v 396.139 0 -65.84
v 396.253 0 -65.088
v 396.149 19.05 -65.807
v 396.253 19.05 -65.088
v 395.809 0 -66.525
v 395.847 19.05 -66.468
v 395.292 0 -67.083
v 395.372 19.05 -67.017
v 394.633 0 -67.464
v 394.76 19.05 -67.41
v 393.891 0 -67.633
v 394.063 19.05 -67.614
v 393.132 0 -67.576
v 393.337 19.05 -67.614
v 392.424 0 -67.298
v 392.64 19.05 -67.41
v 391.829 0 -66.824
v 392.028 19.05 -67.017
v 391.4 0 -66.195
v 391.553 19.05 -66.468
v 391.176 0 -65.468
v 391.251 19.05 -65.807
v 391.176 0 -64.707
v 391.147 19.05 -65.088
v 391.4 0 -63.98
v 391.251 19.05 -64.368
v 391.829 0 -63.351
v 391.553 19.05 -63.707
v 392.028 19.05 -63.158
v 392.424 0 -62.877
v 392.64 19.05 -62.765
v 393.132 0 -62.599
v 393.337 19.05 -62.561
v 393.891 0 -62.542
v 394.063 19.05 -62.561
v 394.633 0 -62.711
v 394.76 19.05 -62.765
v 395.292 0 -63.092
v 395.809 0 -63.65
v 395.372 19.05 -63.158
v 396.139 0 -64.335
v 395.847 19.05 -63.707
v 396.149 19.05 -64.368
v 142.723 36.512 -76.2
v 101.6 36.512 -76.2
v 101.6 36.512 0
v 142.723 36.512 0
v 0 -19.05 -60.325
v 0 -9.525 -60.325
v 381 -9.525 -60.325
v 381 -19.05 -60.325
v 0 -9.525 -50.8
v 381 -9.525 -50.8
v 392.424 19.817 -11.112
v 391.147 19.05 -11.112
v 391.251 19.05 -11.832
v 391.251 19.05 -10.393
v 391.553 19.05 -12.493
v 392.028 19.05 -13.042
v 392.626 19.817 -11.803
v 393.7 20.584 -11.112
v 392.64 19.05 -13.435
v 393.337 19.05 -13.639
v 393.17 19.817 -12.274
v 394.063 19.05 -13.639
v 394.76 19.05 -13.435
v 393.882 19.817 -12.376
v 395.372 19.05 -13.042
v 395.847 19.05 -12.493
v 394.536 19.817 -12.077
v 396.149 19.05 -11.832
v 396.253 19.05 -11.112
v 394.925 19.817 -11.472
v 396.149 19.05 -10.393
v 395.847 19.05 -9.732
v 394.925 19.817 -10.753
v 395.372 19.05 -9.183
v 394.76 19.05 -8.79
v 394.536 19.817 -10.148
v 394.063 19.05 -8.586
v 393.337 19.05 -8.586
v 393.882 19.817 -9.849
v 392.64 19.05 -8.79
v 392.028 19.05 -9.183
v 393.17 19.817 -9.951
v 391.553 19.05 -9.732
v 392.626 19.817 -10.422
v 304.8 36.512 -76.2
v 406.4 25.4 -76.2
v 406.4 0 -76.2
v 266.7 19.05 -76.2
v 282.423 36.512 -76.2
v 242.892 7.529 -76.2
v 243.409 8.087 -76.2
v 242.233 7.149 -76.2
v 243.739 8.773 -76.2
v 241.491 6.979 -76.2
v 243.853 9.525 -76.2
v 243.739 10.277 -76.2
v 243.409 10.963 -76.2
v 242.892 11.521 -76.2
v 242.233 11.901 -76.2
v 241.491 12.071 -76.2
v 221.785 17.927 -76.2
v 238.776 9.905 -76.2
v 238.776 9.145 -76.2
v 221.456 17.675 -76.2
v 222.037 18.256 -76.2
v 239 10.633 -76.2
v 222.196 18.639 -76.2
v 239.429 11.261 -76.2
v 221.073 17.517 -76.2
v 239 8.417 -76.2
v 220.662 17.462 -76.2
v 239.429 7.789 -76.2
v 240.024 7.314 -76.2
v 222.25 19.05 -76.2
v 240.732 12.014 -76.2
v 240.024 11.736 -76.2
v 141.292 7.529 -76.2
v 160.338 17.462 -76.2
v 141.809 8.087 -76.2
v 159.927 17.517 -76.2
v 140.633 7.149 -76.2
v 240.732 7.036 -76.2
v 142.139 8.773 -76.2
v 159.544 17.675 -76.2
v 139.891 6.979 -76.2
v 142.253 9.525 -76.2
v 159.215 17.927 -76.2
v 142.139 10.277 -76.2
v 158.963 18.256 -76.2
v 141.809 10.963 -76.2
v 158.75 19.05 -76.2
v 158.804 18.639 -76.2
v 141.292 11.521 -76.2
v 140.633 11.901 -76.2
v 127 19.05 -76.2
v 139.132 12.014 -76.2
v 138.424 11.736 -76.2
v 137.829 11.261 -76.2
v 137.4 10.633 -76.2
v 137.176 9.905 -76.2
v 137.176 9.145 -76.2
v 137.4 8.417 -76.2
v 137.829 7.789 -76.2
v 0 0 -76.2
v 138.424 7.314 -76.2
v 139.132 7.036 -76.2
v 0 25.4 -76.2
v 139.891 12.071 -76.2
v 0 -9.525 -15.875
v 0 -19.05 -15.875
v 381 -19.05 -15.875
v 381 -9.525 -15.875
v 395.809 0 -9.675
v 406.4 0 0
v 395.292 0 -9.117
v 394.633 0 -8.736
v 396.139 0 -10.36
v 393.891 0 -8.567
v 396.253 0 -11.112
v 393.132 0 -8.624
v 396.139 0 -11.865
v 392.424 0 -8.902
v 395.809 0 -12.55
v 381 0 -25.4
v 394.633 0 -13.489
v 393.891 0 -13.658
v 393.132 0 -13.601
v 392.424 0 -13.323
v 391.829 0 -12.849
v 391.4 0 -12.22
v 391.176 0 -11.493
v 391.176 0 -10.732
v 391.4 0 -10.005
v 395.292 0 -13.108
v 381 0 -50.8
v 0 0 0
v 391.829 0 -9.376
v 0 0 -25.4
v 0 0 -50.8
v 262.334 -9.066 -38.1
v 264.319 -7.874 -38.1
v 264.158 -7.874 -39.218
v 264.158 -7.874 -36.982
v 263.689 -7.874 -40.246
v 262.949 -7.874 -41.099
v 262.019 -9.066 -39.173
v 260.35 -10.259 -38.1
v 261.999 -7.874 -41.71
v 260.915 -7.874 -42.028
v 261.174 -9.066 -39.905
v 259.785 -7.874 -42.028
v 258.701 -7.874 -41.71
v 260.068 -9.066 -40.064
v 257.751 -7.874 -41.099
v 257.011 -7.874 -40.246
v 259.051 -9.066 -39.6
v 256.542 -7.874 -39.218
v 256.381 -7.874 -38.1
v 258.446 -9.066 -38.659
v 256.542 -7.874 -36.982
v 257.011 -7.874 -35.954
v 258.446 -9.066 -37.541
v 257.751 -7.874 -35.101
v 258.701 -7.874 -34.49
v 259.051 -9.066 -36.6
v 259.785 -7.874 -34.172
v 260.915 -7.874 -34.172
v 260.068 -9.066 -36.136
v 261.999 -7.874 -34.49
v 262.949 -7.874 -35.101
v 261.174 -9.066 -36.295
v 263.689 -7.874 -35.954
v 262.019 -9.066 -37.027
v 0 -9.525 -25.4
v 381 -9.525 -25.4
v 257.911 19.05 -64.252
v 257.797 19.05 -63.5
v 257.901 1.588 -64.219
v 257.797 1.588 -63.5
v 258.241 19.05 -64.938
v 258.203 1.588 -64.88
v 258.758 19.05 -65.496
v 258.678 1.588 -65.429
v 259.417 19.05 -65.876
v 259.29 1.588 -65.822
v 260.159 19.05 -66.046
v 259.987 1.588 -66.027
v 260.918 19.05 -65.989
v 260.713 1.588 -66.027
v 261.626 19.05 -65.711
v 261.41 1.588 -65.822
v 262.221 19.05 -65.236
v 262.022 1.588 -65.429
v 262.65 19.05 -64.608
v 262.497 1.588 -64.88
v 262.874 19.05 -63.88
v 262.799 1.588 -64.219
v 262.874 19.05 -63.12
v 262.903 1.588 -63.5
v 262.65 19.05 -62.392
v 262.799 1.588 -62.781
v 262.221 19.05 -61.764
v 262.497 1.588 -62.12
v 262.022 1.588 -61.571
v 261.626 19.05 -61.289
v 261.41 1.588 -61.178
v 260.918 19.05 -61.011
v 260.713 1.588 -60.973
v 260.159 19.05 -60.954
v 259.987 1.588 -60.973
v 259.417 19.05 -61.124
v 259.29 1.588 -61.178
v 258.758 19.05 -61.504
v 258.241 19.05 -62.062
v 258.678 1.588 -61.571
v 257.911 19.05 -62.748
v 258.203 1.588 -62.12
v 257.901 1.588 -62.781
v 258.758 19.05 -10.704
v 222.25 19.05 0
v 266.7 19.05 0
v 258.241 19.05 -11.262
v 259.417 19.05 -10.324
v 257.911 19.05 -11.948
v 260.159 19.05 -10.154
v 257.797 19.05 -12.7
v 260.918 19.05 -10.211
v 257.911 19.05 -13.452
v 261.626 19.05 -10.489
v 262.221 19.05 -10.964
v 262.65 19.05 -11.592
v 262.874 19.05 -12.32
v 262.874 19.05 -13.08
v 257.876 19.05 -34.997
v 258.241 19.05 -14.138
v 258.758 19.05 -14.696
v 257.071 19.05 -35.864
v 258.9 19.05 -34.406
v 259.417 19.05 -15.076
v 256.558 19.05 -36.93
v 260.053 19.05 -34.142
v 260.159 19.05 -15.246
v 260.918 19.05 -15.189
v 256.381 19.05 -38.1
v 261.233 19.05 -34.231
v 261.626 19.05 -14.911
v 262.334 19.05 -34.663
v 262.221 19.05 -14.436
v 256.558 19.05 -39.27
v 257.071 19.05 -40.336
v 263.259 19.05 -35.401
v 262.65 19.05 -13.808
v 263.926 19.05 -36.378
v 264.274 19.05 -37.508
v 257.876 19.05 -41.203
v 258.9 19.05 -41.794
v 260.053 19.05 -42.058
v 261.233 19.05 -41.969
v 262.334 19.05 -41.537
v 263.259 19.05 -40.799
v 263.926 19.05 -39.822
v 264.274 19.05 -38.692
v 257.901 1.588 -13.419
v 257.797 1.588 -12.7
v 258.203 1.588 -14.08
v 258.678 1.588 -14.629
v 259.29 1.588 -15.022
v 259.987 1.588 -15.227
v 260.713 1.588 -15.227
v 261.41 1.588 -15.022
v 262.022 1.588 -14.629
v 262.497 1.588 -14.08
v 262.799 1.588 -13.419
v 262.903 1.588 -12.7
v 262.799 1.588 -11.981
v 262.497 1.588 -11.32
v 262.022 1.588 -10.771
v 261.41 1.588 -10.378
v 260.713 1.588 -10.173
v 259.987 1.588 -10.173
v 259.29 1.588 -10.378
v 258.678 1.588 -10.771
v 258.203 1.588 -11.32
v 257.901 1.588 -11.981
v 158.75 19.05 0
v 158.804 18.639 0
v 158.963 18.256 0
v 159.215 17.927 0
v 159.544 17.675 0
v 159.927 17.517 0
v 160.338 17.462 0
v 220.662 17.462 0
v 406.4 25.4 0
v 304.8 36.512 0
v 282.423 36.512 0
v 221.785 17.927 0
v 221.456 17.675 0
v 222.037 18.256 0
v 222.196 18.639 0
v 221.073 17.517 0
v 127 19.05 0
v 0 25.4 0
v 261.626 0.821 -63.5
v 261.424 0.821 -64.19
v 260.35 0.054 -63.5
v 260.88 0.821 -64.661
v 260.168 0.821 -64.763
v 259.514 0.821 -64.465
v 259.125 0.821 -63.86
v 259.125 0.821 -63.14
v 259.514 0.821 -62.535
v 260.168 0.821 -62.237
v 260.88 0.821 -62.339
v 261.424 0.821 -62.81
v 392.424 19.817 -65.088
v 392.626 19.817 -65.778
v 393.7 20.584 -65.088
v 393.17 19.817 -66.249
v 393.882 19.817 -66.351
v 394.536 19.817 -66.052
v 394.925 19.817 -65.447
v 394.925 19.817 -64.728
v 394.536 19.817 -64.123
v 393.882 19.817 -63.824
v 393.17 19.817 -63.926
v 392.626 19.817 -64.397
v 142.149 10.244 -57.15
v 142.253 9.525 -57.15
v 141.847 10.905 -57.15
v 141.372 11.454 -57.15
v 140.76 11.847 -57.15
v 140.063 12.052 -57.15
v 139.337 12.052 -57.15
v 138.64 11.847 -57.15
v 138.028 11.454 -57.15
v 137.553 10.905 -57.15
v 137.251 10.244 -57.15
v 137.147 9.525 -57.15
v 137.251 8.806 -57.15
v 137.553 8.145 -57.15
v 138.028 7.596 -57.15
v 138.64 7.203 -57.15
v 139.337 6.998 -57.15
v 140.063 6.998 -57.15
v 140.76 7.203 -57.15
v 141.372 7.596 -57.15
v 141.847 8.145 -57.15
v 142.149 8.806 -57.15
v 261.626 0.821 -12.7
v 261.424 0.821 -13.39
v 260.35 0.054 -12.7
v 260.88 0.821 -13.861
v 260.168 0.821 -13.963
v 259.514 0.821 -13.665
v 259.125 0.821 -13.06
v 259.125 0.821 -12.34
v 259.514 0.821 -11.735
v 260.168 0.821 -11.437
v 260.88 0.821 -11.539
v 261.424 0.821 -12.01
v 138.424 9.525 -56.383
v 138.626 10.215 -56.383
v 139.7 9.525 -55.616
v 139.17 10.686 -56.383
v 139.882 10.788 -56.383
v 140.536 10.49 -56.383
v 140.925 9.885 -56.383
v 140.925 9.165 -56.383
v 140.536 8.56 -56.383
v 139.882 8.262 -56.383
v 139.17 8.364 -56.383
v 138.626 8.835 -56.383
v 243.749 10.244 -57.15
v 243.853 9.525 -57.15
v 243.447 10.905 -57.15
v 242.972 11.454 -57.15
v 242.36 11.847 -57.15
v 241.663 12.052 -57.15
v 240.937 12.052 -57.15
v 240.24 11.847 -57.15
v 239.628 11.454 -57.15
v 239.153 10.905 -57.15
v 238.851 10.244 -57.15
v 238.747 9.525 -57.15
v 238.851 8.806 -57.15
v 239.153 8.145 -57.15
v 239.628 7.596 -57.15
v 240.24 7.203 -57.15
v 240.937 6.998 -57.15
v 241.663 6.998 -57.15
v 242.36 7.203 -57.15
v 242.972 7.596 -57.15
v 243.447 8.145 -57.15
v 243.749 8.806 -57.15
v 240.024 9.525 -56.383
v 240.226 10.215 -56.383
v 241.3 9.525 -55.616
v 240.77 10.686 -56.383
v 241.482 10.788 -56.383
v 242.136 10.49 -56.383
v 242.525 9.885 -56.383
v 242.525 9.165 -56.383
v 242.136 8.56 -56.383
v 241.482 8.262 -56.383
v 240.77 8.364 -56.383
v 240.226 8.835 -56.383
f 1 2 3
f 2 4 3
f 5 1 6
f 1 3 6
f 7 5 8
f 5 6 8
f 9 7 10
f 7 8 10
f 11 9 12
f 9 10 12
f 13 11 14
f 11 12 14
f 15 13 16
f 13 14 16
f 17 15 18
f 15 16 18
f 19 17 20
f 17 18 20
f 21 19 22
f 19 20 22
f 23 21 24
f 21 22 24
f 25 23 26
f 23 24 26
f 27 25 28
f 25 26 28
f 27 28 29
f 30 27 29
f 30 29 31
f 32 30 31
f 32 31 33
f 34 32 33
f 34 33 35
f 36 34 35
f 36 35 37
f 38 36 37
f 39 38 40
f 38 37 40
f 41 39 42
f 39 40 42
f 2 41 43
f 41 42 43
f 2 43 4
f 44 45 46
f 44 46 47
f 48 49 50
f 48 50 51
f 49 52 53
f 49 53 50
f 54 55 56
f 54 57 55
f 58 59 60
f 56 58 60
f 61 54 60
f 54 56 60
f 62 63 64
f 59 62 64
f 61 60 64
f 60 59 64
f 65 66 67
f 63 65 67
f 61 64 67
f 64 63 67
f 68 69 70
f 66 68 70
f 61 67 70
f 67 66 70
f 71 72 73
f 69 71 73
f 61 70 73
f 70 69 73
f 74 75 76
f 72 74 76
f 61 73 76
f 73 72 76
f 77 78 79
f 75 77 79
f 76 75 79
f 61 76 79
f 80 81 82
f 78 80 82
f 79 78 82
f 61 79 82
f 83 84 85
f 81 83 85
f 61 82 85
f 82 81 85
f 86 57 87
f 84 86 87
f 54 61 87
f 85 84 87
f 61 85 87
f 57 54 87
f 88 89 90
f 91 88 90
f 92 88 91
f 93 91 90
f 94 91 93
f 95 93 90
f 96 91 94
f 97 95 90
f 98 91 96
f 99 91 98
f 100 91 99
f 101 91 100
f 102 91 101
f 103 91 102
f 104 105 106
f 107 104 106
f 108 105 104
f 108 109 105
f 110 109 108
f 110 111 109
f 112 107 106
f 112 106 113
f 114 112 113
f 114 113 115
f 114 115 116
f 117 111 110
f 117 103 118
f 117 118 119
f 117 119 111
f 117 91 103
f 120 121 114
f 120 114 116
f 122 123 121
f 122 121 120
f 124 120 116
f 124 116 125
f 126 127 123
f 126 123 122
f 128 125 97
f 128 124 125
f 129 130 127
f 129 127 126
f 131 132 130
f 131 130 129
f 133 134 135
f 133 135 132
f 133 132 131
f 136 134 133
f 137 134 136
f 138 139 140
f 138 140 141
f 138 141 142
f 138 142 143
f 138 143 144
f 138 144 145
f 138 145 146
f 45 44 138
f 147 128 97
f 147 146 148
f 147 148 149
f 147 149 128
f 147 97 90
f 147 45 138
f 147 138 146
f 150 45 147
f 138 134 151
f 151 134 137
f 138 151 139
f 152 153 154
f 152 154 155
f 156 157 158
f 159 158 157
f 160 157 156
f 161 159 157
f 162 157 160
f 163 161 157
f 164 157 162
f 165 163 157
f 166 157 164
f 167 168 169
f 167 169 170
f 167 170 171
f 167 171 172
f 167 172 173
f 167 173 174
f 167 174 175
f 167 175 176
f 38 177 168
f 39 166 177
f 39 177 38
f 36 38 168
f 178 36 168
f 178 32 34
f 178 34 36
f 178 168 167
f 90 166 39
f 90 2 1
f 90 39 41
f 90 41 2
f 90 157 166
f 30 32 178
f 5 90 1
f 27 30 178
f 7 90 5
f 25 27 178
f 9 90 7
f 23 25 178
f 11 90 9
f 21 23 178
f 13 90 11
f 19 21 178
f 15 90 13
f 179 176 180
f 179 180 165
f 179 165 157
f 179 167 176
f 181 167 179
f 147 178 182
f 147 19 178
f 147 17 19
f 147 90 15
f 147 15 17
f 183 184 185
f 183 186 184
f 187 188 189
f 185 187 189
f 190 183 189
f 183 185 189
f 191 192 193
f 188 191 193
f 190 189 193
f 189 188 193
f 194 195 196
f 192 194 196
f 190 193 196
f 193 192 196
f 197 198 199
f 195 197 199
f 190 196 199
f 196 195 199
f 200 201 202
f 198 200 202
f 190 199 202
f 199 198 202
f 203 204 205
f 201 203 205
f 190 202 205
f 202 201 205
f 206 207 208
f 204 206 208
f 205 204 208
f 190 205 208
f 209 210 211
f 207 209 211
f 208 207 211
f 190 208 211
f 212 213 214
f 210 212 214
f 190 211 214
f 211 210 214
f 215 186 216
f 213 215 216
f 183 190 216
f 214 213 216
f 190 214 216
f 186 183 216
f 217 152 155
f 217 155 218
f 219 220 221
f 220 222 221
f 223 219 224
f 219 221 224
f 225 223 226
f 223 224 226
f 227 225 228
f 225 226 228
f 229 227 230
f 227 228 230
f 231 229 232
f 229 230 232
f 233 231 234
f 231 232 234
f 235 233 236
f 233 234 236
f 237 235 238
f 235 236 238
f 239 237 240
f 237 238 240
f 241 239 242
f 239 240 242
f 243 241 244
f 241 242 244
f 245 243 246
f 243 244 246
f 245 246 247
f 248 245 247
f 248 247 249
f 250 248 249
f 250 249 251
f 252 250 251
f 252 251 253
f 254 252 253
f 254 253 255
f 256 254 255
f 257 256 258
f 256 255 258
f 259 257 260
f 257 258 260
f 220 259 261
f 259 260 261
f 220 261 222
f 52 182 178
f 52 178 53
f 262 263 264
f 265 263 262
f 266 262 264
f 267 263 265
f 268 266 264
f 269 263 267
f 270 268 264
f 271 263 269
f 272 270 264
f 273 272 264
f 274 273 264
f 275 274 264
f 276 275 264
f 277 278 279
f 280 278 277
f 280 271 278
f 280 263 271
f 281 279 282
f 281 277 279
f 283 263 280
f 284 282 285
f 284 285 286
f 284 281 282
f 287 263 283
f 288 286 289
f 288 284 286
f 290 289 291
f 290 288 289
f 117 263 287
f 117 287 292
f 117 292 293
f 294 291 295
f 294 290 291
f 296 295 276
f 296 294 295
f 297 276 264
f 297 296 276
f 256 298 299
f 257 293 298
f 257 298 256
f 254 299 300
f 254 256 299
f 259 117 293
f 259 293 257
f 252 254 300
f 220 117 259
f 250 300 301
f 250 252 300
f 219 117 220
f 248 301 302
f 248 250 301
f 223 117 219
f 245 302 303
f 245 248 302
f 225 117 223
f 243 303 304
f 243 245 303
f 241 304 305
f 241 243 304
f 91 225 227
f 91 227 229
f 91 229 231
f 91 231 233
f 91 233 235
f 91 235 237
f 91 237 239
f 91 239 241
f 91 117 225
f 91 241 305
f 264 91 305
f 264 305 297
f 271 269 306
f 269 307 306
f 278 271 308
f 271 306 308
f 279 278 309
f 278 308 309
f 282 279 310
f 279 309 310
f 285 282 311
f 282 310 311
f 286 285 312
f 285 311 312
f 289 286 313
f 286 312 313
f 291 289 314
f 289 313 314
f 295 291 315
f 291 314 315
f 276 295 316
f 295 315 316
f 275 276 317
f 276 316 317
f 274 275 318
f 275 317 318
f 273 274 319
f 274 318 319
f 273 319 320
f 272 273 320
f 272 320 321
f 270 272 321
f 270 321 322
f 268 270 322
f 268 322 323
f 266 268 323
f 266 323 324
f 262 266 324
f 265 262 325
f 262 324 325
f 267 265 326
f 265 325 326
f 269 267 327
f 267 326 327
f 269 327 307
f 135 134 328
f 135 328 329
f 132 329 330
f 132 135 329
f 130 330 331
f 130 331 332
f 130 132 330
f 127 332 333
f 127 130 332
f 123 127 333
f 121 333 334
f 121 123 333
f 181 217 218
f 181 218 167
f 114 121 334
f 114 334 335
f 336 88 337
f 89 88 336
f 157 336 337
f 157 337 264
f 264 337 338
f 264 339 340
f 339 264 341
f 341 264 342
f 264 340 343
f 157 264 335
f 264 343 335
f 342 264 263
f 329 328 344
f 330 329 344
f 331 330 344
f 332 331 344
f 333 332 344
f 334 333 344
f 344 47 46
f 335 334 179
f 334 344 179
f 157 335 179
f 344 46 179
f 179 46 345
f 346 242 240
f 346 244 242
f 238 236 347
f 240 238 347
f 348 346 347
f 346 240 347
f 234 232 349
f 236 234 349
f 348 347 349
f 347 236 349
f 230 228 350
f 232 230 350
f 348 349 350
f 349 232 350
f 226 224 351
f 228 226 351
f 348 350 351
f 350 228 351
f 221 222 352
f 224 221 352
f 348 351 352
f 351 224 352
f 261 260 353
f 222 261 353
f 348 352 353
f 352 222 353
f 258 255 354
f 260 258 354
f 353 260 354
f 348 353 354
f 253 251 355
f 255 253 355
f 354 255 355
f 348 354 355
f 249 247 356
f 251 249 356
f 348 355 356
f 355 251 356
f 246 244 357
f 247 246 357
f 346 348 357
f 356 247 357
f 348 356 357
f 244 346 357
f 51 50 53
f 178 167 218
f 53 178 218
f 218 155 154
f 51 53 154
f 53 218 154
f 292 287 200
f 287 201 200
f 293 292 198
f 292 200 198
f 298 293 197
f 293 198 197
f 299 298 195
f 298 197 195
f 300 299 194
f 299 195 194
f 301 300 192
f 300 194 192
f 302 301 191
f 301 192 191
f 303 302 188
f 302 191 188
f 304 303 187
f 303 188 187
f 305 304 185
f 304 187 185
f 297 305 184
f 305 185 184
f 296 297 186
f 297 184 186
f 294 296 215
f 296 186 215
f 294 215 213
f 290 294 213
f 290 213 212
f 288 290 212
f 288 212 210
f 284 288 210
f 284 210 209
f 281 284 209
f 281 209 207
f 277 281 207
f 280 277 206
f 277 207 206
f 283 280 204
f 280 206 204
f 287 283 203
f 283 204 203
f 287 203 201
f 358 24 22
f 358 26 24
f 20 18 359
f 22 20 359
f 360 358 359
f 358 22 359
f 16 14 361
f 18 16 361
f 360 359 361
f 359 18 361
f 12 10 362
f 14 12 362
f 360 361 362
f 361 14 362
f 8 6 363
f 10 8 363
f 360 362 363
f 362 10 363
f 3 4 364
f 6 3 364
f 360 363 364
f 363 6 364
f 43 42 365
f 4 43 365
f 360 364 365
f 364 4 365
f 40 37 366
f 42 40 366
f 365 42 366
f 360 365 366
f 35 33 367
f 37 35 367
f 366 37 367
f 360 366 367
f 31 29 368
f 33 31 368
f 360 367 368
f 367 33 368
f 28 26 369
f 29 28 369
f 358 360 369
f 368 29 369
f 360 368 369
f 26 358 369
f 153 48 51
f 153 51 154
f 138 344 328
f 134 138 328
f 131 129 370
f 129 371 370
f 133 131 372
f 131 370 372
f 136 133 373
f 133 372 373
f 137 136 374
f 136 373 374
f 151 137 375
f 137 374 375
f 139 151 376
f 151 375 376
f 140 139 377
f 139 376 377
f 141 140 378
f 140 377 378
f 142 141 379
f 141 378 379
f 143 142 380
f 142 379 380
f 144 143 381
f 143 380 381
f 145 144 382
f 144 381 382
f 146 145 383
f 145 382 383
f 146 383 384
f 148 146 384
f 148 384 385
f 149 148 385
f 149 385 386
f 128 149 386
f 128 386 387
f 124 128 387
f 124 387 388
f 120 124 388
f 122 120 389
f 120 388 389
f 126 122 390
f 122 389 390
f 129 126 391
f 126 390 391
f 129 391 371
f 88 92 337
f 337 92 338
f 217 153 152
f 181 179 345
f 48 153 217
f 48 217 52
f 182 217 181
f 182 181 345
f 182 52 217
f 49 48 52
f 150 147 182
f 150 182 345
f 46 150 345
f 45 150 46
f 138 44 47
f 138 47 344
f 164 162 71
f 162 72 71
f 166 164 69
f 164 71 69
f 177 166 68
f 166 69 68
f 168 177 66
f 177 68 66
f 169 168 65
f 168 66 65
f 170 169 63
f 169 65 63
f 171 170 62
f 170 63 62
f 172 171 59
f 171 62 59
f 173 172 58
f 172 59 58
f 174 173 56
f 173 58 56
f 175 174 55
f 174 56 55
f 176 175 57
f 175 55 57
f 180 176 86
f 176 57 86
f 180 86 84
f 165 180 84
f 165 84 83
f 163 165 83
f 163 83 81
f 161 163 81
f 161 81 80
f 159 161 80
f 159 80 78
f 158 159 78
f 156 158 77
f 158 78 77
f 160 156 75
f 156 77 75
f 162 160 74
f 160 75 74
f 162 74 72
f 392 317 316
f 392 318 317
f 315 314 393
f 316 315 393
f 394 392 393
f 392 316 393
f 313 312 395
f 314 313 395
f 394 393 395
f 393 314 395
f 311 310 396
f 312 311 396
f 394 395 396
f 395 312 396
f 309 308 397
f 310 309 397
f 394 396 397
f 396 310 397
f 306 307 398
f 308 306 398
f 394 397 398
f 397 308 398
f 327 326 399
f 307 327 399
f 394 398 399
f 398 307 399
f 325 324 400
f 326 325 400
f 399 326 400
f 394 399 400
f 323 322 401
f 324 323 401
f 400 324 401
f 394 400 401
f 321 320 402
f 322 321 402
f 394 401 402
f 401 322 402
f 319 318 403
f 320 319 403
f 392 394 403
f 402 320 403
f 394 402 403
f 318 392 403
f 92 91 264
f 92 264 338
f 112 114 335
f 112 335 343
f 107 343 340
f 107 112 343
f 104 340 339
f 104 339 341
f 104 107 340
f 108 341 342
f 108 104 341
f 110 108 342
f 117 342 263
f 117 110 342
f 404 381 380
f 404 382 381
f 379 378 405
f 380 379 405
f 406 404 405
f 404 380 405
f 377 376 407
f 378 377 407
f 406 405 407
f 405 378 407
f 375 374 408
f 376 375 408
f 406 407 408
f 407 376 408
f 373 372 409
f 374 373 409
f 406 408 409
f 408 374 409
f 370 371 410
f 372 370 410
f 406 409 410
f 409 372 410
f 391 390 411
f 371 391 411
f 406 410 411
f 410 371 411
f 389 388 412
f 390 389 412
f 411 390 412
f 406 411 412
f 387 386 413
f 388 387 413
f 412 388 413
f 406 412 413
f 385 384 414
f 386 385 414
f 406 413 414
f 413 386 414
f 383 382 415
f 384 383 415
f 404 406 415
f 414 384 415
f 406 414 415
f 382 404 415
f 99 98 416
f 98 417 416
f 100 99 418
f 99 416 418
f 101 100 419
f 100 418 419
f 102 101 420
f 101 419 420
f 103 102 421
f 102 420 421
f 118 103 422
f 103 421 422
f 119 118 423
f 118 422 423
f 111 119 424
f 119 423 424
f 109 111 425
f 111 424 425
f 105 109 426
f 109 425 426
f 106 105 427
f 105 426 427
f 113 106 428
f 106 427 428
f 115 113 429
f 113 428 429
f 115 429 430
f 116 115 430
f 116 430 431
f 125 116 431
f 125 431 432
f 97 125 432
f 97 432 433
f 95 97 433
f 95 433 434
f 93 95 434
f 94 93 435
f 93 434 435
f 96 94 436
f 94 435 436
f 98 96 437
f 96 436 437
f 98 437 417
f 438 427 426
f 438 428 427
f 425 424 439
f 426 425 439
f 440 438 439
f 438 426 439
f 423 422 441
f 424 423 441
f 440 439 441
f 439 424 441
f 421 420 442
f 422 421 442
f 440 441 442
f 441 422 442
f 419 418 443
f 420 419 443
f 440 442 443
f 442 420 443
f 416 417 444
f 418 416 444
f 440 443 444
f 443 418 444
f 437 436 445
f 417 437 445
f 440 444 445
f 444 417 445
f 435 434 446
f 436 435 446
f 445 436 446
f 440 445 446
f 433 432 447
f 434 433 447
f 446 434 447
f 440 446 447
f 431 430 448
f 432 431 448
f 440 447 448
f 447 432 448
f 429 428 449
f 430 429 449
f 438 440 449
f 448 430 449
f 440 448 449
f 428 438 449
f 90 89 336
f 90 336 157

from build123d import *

# Parameters (mm, degrees)
BOSS_EXTRUDE1_DEPTH         = 76.2
BOSS_EXTRUDE2_DEPTH         = 381
F_1_4_20_TAPPED_HOLE3_D     = 5.1054
F_1_4_20_TAPPED_HOLE3_DEPTH = 19.05
F_1_4_20_TAPPED_HOLE3_TIP   = 1.533816902
F_1_4_20_TAPPED_HOLE2_D     = 5.1054
F_1_4_20_TAPPED_HOLE2_DEPTH = 19.05
F_1_4_20_TAPPED_HOLE2_TIP   = 1.533816902
F_3_8_16_TAPPED_HOLE1_D     = 7.9375
F_3_8_16_TAPPED_HOLE1_DEPTH = 26.924
F_3_8_16_TAPPED_HOLE1_TIP   = 2.384665582
F_1_4_20_TAPPED_HOLE1_D     = 5.1054
F_1_4_20_TAPPED_HOLE1_DEPTH = 17.4625
F_1_4_20_TAPPED_HOLE1_TIP   = 1.533816902
CHAMFER1_SIZE               = 20.492049699
CHAMFER1_SIZE2              = 2.998111049


with BuildPart() as part:
    # Sketch1 → Boss-Extrude1 (new body)
    with BuildSketch(Plane(origin=(0, 0, -76.2), x_dir=(-1, 0, 0), z_dir=(0, 0, -1))):
        with BuildLine():
            Line((0, 0), (0, 25.4))
            Line((0, 25.4), (-101.6, 36.5125))
            Line((-101.6, 36.5125), (-142.723305624, 36.5125))
            Line((-142.723305624, 36.5125), (-127, 19.05))
            Line((-127, 19.05), (-158.75, 19.05))
            ThreePointArc((-158.75, 19.05), (-159.214967985, 17.927467985), (-160.3375, 17.4625))
            Line((-160.3375, 17.4625), (-220.6625, 17.4625))
            ThreePointArc((-220.6625, 17.4625), (-221.785032015, 17.927467985), (-222.25, 19.05))
            Line((-222.25, 19.05), (-266.7, 19.05))
            Line((-266.7, 19.05), (-284.429433488, 38.740530712))
            Line((-284.429433488, 38.740530712), (-406.4, 25.4))
            Line((-406.4, 25.4), (-406.4, 0))
            Line((-406.4, 0), (0, 0))
        make_face()
    extrude(amount=-BOSS_EXTRUDE1_DEPTH)

    # Sketch2 → Boss-Extrude2 (add)
    with BuildSketch(Plane(origin=(0, 0, 0), x_dir=(0, -1, 0), z_dir=(-1, 0, 0))):
        Polygon((0, -25.4), (0, -50.8), (9.525, -50.8), (9.525, -60.325), (19.05, -60.325), (19.05, -15.875), (9.525, -15.875), (9.525, -25.4), align=None)
    extrude(amount=-BOSS_EXTRUDE2_DEPTH)

    # 1/4-20 Tapped Hole3
    with Locations(Plane(origin=(0, 0, 0), x_dir=(-1, 0, 0), z_dir=(0, -1, 0))):
        with Locations((-393.7, 65.0875), (-393.7, 11.1125)):
            Hole(F_1_4_20_TAPPED_HOLE3_D / 2, depth=F_1_4_20_TAPPED_HOLE3_DEPTH)
            with Locations((0, 0, -(F_1_4_20_TAPPED_HOLE3_DEPTH + F_1_4_20_TAPPED_HOLE3_TIP / 2))):  # 118° drill point
                Cone(0, F_1_4_20_TAPPED_HOLE3_D / 2, F_1_4_20_TAPPED_HOLE3_TIP, mode=Mode.SUBTRACT)

    # 1/4-20 Tapped Hole2
    with Locations(Plane(origin=(0, 0, -76.2), x_dir=(-1, 0, 0), z_dir=(0, 0, -1))):
        with Locations((-139.7, 9.525), (-241.3, 9.525)):
            Hole(F_1_4_20_TAPPED_HOLE2_D / 2, depth=F_1_4_20_TAPPED_HOLE2_DEPTH)
            with Locations((0, 0, -(F_1_4_20_TAPPED_HOLE2_DEPTH + F_1_4_20_TAPPED_HOLE2_TIP / 2))):  # 118° drill point
                Cone(0, F_1_4_20_TAPPED_HOLE2_D / 2, F_1_4_20_TAPPED_HOLE2_TIP, mode=Mode.SUBTRACT)

    # 3/8-16 Tapped Hole1
    with Locations(Plane(origin=(0, 19.05, 0), x_dir=(1, 0, 0), z_dir=(0, 1, 0))):
        with Locations((260.35, 38.1)):
            Hole(F_3_8_16_TAPPED_HOLE1_D / 2, depth=F_3_8_16_TAPPED_HOLE1_DEPTH)
            with Locations((0, 0, -(F_3_8_16_TAPPED_HOLE1_DEPTH + F_3_8_16_TAPPED_HOLE1_TIP / 2))):  # 118° drill point
                Cone(0, F_3_8_16_TAPPED_HOLE1_D / 2, F_3_8_16_TAPPED_HOLE1_TIP, mode=Mode.SUBTRACT)

    # 1/4-20 Tapped Hole1
    with Locations(Plane(origin=(0, 19.05, 0), x_dir=(1, 0, 0), z_dir=(0, 1, 0))):
        with Locations((260.35, 12.7), (260.35, 63.5)):
            Hole(F_1_4_20_TAPPED_HOLE1_D / 2, depth=F_1_4_20_TAPPED_HOLE1_DEPTH)
            with Locations((0, 0, -(F_1_4_20_TAPPED_HOLE1_DEPTH + F_1_4_20_TAPPED_HOLE1_TIP / 2))):  # 118° drill point
                Cone(0, F_1_4_20_TAPPED_HOLE1_D / 2, F_1_4_20_TAPPED_HOLE1_TIP, mode=Mode.SUBTRACT)

    # Chamfer1
    chamfer1_edges = [part.edges().sort_by_distance(p)[0] for p in [
        (284.429433488, 38.740530712, -38.1),
    ]]
    chamfer1_side = [part.faces().sort_by_distance(p)[0] for p in [
        (345.414716744, 32.070265356, -38.1),
    ]]
    chamfer(chamfer1_edges, length=CHAMFER1_SIZE, length2=CHAMFER1_SIZE2, reference=chamfer1_side[0])


solid = part.part
